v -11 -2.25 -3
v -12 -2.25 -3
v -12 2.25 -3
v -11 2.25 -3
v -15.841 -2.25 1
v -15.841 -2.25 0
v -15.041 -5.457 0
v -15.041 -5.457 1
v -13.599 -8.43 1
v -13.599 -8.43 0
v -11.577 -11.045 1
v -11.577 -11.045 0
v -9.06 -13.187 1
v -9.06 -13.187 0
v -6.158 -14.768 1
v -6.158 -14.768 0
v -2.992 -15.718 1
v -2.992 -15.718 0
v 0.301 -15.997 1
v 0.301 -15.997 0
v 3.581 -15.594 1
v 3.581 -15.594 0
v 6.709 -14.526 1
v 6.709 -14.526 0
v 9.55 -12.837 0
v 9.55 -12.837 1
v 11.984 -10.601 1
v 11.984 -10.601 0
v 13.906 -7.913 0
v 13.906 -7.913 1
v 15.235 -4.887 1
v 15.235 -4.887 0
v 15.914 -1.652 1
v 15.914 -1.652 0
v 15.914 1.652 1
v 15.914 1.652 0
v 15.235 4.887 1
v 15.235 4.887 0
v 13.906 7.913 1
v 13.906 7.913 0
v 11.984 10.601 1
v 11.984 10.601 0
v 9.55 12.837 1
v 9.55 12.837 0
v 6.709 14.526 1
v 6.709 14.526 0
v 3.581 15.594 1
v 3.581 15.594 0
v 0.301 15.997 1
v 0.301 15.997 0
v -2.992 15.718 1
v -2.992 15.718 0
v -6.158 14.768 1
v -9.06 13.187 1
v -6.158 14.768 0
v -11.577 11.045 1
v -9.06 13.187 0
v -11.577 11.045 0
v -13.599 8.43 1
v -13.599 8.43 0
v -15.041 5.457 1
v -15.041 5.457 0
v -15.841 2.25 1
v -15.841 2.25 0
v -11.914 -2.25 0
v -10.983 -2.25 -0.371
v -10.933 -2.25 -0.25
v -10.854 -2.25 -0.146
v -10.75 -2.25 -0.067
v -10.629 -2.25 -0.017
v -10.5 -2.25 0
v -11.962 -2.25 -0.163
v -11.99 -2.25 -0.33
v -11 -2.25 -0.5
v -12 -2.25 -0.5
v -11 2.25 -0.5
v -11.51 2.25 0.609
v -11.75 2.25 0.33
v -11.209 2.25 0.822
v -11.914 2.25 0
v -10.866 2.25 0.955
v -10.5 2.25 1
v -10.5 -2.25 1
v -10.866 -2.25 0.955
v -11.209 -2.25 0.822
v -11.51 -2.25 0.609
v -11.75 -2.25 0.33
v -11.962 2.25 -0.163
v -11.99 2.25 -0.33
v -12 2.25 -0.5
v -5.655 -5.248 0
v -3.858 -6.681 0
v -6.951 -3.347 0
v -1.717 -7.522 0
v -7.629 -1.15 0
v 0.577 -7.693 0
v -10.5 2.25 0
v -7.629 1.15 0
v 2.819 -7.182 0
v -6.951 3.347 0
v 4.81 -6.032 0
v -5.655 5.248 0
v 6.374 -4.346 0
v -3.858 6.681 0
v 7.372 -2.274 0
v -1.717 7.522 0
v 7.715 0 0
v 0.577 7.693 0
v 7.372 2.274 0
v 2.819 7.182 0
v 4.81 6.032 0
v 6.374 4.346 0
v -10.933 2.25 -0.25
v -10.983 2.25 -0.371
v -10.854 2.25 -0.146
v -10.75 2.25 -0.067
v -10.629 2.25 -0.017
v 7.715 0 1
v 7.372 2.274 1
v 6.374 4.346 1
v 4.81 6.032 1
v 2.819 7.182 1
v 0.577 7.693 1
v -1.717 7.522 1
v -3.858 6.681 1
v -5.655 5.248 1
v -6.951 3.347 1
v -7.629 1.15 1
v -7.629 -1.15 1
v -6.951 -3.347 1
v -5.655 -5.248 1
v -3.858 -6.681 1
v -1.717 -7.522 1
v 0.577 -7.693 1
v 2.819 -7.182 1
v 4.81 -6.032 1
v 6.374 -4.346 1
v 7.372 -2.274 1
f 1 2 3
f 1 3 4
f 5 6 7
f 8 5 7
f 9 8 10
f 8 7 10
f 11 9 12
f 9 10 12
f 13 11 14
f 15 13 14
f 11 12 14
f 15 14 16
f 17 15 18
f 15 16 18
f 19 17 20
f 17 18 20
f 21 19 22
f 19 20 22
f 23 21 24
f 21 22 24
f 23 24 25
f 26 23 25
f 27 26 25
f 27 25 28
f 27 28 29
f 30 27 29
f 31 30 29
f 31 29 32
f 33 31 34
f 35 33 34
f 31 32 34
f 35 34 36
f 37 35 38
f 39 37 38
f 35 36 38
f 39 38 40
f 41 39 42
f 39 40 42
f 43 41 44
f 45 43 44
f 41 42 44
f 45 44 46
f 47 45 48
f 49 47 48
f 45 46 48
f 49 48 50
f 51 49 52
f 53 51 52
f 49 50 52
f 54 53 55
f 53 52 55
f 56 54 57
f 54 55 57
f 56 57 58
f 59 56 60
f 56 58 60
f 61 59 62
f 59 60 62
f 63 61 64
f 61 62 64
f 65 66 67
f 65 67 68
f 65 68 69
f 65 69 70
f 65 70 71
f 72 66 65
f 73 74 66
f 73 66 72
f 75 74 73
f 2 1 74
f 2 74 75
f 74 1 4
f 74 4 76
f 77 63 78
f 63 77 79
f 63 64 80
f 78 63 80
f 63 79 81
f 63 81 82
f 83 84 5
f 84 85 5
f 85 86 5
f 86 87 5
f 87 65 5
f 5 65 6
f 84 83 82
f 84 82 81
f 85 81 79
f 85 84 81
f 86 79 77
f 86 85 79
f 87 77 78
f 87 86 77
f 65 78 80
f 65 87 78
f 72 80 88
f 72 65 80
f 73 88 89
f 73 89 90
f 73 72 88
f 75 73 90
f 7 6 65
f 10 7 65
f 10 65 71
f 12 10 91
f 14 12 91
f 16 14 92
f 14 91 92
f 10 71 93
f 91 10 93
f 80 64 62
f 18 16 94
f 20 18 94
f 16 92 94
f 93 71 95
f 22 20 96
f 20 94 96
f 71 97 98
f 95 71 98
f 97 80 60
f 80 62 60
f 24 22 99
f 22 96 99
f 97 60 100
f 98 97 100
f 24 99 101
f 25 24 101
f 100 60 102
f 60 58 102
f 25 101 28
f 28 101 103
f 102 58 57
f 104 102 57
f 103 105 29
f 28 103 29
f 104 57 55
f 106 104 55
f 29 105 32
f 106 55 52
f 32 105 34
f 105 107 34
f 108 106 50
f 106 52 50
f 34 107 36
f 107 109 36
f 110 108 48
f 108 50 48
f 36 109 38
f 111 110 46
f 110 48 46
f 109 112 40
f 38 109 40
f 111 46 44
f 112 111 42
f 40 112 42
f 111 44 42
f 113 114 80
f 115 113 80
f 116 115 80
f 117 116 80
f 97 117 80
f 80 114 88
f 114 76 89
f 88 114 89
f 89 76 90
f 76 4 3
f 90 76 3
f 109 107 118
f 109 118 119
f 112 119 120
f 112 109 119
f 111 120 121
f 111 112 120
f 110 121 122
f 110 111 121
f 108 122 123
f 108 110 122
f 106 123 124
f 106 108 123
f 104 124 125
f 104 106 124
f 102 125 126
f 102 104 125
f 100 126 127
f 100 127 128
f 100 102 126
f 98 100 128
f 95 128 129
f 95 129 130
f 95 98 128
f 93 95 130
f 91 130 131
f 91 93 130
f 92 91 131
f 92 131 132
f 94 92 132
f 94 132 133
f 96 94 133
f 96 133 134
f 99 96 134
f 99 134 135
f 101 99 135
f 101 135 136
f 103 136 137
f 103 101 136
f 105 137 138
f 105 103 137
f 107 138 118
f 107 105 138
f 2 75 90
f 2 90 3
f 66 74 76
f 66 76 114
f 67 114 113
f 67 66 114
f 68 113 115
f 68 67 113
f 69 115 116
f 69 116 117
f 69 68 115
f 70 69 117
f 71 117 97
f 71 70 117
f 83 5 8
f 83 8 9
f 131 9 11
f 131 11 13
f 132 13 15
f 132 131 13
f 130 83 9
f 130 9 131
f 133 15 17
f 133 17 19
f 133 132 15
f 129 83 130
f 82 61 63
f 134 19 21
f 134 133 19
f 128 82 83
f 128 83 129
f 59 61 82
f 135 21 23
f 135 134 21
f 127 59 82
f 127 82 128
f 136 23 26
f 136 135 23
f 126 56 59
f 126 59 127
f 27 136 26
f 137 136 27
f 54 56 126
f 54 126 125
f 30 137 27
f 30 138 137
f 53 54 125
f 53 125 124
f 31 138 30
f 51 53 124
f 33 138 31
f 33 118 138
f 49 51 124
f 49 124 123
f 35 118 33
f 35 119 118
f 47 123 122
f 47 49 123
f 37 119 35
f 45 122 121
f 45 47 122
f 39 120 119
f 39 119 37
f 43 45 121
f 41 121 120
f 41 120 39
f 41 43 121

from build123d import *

# Parameters (mm, degrees)
SKETCH1_R                    = 7.715
BASE_FLANGE1_DEPTH           = 1
EDGE_FLANGE1_STRIP_W         = 5
EDGE_FLANGE1_STRIP_H         = 1
EDGE_FLANGE1_STRIP_CUT_DEPTH = 4.5
EDGE_FLANGE1_DEPTH           = 4.5


# Sheet-metal steps are written as plain solids
with BuildPart() as part:
    # Sketch1 → Base-Flange1 (new body)
    with BuildSketch(Plane.XY):
        with BuildLine():
            Line((-15.841006912, 2.25), (-12, 2.25))
            Line((-12, 2.25), (-12, -2.25))
            Line((-12, -2.25), (-15.841006912, -2.25))
            ThreePointArc((-15.841006912, -2.25), (16, 0), (-15.841006912, 2.25))
        make_face()
        Circle(SKETCH1_R, mode=Mode.SUBTRACT)
    extrude(amount=BASE_FLANGE1_DEPTH)

    # Edge-Flange1 strip (across the edge) → Edge-Flange1 strip cut (cut)
    with BuildSketch(Plane(origin=(-12, -2.25, 0), x_dir=(1, 0, 0), z_dir=(0, 1, 0))):
        with Locations((-1, -0.5)):
            Rectangle(EDGE_FLANGE1_STRIP_W, EDGE_FLANGE1_STRIP_H)
    extrude(amount=EDGE_FLANGE1_STRIP_CUT_DEPTH, mode=Mode.SUBTRACT)

    # Edge-Flange1 section (across the edge) → Edge-Flange1 (add)
    with BuildSketch(Plane(origin=(-12, -2.25, 0), x_dir=(1, 0, 0), z_dir=(0, 1, 0))):
        with BuildLine():
            Line((0, 0.5), (0, 3))
            Line((0, 3), (1, 3))
            Line((1, 3), (1, 0.5))
            ThreePointArc((1, 0.5), (1.146446609, 0.146446609), (1.5, 0))
            Line((1.5, 0), (1.5, -1))
            ThreePointArc((1.5, -1), (0.439339828, -0.560660172), (0, 0.5))
        make_face()
    extrude(amount=EDGE_FLANGE1_DEPTH)


solid = part.part
